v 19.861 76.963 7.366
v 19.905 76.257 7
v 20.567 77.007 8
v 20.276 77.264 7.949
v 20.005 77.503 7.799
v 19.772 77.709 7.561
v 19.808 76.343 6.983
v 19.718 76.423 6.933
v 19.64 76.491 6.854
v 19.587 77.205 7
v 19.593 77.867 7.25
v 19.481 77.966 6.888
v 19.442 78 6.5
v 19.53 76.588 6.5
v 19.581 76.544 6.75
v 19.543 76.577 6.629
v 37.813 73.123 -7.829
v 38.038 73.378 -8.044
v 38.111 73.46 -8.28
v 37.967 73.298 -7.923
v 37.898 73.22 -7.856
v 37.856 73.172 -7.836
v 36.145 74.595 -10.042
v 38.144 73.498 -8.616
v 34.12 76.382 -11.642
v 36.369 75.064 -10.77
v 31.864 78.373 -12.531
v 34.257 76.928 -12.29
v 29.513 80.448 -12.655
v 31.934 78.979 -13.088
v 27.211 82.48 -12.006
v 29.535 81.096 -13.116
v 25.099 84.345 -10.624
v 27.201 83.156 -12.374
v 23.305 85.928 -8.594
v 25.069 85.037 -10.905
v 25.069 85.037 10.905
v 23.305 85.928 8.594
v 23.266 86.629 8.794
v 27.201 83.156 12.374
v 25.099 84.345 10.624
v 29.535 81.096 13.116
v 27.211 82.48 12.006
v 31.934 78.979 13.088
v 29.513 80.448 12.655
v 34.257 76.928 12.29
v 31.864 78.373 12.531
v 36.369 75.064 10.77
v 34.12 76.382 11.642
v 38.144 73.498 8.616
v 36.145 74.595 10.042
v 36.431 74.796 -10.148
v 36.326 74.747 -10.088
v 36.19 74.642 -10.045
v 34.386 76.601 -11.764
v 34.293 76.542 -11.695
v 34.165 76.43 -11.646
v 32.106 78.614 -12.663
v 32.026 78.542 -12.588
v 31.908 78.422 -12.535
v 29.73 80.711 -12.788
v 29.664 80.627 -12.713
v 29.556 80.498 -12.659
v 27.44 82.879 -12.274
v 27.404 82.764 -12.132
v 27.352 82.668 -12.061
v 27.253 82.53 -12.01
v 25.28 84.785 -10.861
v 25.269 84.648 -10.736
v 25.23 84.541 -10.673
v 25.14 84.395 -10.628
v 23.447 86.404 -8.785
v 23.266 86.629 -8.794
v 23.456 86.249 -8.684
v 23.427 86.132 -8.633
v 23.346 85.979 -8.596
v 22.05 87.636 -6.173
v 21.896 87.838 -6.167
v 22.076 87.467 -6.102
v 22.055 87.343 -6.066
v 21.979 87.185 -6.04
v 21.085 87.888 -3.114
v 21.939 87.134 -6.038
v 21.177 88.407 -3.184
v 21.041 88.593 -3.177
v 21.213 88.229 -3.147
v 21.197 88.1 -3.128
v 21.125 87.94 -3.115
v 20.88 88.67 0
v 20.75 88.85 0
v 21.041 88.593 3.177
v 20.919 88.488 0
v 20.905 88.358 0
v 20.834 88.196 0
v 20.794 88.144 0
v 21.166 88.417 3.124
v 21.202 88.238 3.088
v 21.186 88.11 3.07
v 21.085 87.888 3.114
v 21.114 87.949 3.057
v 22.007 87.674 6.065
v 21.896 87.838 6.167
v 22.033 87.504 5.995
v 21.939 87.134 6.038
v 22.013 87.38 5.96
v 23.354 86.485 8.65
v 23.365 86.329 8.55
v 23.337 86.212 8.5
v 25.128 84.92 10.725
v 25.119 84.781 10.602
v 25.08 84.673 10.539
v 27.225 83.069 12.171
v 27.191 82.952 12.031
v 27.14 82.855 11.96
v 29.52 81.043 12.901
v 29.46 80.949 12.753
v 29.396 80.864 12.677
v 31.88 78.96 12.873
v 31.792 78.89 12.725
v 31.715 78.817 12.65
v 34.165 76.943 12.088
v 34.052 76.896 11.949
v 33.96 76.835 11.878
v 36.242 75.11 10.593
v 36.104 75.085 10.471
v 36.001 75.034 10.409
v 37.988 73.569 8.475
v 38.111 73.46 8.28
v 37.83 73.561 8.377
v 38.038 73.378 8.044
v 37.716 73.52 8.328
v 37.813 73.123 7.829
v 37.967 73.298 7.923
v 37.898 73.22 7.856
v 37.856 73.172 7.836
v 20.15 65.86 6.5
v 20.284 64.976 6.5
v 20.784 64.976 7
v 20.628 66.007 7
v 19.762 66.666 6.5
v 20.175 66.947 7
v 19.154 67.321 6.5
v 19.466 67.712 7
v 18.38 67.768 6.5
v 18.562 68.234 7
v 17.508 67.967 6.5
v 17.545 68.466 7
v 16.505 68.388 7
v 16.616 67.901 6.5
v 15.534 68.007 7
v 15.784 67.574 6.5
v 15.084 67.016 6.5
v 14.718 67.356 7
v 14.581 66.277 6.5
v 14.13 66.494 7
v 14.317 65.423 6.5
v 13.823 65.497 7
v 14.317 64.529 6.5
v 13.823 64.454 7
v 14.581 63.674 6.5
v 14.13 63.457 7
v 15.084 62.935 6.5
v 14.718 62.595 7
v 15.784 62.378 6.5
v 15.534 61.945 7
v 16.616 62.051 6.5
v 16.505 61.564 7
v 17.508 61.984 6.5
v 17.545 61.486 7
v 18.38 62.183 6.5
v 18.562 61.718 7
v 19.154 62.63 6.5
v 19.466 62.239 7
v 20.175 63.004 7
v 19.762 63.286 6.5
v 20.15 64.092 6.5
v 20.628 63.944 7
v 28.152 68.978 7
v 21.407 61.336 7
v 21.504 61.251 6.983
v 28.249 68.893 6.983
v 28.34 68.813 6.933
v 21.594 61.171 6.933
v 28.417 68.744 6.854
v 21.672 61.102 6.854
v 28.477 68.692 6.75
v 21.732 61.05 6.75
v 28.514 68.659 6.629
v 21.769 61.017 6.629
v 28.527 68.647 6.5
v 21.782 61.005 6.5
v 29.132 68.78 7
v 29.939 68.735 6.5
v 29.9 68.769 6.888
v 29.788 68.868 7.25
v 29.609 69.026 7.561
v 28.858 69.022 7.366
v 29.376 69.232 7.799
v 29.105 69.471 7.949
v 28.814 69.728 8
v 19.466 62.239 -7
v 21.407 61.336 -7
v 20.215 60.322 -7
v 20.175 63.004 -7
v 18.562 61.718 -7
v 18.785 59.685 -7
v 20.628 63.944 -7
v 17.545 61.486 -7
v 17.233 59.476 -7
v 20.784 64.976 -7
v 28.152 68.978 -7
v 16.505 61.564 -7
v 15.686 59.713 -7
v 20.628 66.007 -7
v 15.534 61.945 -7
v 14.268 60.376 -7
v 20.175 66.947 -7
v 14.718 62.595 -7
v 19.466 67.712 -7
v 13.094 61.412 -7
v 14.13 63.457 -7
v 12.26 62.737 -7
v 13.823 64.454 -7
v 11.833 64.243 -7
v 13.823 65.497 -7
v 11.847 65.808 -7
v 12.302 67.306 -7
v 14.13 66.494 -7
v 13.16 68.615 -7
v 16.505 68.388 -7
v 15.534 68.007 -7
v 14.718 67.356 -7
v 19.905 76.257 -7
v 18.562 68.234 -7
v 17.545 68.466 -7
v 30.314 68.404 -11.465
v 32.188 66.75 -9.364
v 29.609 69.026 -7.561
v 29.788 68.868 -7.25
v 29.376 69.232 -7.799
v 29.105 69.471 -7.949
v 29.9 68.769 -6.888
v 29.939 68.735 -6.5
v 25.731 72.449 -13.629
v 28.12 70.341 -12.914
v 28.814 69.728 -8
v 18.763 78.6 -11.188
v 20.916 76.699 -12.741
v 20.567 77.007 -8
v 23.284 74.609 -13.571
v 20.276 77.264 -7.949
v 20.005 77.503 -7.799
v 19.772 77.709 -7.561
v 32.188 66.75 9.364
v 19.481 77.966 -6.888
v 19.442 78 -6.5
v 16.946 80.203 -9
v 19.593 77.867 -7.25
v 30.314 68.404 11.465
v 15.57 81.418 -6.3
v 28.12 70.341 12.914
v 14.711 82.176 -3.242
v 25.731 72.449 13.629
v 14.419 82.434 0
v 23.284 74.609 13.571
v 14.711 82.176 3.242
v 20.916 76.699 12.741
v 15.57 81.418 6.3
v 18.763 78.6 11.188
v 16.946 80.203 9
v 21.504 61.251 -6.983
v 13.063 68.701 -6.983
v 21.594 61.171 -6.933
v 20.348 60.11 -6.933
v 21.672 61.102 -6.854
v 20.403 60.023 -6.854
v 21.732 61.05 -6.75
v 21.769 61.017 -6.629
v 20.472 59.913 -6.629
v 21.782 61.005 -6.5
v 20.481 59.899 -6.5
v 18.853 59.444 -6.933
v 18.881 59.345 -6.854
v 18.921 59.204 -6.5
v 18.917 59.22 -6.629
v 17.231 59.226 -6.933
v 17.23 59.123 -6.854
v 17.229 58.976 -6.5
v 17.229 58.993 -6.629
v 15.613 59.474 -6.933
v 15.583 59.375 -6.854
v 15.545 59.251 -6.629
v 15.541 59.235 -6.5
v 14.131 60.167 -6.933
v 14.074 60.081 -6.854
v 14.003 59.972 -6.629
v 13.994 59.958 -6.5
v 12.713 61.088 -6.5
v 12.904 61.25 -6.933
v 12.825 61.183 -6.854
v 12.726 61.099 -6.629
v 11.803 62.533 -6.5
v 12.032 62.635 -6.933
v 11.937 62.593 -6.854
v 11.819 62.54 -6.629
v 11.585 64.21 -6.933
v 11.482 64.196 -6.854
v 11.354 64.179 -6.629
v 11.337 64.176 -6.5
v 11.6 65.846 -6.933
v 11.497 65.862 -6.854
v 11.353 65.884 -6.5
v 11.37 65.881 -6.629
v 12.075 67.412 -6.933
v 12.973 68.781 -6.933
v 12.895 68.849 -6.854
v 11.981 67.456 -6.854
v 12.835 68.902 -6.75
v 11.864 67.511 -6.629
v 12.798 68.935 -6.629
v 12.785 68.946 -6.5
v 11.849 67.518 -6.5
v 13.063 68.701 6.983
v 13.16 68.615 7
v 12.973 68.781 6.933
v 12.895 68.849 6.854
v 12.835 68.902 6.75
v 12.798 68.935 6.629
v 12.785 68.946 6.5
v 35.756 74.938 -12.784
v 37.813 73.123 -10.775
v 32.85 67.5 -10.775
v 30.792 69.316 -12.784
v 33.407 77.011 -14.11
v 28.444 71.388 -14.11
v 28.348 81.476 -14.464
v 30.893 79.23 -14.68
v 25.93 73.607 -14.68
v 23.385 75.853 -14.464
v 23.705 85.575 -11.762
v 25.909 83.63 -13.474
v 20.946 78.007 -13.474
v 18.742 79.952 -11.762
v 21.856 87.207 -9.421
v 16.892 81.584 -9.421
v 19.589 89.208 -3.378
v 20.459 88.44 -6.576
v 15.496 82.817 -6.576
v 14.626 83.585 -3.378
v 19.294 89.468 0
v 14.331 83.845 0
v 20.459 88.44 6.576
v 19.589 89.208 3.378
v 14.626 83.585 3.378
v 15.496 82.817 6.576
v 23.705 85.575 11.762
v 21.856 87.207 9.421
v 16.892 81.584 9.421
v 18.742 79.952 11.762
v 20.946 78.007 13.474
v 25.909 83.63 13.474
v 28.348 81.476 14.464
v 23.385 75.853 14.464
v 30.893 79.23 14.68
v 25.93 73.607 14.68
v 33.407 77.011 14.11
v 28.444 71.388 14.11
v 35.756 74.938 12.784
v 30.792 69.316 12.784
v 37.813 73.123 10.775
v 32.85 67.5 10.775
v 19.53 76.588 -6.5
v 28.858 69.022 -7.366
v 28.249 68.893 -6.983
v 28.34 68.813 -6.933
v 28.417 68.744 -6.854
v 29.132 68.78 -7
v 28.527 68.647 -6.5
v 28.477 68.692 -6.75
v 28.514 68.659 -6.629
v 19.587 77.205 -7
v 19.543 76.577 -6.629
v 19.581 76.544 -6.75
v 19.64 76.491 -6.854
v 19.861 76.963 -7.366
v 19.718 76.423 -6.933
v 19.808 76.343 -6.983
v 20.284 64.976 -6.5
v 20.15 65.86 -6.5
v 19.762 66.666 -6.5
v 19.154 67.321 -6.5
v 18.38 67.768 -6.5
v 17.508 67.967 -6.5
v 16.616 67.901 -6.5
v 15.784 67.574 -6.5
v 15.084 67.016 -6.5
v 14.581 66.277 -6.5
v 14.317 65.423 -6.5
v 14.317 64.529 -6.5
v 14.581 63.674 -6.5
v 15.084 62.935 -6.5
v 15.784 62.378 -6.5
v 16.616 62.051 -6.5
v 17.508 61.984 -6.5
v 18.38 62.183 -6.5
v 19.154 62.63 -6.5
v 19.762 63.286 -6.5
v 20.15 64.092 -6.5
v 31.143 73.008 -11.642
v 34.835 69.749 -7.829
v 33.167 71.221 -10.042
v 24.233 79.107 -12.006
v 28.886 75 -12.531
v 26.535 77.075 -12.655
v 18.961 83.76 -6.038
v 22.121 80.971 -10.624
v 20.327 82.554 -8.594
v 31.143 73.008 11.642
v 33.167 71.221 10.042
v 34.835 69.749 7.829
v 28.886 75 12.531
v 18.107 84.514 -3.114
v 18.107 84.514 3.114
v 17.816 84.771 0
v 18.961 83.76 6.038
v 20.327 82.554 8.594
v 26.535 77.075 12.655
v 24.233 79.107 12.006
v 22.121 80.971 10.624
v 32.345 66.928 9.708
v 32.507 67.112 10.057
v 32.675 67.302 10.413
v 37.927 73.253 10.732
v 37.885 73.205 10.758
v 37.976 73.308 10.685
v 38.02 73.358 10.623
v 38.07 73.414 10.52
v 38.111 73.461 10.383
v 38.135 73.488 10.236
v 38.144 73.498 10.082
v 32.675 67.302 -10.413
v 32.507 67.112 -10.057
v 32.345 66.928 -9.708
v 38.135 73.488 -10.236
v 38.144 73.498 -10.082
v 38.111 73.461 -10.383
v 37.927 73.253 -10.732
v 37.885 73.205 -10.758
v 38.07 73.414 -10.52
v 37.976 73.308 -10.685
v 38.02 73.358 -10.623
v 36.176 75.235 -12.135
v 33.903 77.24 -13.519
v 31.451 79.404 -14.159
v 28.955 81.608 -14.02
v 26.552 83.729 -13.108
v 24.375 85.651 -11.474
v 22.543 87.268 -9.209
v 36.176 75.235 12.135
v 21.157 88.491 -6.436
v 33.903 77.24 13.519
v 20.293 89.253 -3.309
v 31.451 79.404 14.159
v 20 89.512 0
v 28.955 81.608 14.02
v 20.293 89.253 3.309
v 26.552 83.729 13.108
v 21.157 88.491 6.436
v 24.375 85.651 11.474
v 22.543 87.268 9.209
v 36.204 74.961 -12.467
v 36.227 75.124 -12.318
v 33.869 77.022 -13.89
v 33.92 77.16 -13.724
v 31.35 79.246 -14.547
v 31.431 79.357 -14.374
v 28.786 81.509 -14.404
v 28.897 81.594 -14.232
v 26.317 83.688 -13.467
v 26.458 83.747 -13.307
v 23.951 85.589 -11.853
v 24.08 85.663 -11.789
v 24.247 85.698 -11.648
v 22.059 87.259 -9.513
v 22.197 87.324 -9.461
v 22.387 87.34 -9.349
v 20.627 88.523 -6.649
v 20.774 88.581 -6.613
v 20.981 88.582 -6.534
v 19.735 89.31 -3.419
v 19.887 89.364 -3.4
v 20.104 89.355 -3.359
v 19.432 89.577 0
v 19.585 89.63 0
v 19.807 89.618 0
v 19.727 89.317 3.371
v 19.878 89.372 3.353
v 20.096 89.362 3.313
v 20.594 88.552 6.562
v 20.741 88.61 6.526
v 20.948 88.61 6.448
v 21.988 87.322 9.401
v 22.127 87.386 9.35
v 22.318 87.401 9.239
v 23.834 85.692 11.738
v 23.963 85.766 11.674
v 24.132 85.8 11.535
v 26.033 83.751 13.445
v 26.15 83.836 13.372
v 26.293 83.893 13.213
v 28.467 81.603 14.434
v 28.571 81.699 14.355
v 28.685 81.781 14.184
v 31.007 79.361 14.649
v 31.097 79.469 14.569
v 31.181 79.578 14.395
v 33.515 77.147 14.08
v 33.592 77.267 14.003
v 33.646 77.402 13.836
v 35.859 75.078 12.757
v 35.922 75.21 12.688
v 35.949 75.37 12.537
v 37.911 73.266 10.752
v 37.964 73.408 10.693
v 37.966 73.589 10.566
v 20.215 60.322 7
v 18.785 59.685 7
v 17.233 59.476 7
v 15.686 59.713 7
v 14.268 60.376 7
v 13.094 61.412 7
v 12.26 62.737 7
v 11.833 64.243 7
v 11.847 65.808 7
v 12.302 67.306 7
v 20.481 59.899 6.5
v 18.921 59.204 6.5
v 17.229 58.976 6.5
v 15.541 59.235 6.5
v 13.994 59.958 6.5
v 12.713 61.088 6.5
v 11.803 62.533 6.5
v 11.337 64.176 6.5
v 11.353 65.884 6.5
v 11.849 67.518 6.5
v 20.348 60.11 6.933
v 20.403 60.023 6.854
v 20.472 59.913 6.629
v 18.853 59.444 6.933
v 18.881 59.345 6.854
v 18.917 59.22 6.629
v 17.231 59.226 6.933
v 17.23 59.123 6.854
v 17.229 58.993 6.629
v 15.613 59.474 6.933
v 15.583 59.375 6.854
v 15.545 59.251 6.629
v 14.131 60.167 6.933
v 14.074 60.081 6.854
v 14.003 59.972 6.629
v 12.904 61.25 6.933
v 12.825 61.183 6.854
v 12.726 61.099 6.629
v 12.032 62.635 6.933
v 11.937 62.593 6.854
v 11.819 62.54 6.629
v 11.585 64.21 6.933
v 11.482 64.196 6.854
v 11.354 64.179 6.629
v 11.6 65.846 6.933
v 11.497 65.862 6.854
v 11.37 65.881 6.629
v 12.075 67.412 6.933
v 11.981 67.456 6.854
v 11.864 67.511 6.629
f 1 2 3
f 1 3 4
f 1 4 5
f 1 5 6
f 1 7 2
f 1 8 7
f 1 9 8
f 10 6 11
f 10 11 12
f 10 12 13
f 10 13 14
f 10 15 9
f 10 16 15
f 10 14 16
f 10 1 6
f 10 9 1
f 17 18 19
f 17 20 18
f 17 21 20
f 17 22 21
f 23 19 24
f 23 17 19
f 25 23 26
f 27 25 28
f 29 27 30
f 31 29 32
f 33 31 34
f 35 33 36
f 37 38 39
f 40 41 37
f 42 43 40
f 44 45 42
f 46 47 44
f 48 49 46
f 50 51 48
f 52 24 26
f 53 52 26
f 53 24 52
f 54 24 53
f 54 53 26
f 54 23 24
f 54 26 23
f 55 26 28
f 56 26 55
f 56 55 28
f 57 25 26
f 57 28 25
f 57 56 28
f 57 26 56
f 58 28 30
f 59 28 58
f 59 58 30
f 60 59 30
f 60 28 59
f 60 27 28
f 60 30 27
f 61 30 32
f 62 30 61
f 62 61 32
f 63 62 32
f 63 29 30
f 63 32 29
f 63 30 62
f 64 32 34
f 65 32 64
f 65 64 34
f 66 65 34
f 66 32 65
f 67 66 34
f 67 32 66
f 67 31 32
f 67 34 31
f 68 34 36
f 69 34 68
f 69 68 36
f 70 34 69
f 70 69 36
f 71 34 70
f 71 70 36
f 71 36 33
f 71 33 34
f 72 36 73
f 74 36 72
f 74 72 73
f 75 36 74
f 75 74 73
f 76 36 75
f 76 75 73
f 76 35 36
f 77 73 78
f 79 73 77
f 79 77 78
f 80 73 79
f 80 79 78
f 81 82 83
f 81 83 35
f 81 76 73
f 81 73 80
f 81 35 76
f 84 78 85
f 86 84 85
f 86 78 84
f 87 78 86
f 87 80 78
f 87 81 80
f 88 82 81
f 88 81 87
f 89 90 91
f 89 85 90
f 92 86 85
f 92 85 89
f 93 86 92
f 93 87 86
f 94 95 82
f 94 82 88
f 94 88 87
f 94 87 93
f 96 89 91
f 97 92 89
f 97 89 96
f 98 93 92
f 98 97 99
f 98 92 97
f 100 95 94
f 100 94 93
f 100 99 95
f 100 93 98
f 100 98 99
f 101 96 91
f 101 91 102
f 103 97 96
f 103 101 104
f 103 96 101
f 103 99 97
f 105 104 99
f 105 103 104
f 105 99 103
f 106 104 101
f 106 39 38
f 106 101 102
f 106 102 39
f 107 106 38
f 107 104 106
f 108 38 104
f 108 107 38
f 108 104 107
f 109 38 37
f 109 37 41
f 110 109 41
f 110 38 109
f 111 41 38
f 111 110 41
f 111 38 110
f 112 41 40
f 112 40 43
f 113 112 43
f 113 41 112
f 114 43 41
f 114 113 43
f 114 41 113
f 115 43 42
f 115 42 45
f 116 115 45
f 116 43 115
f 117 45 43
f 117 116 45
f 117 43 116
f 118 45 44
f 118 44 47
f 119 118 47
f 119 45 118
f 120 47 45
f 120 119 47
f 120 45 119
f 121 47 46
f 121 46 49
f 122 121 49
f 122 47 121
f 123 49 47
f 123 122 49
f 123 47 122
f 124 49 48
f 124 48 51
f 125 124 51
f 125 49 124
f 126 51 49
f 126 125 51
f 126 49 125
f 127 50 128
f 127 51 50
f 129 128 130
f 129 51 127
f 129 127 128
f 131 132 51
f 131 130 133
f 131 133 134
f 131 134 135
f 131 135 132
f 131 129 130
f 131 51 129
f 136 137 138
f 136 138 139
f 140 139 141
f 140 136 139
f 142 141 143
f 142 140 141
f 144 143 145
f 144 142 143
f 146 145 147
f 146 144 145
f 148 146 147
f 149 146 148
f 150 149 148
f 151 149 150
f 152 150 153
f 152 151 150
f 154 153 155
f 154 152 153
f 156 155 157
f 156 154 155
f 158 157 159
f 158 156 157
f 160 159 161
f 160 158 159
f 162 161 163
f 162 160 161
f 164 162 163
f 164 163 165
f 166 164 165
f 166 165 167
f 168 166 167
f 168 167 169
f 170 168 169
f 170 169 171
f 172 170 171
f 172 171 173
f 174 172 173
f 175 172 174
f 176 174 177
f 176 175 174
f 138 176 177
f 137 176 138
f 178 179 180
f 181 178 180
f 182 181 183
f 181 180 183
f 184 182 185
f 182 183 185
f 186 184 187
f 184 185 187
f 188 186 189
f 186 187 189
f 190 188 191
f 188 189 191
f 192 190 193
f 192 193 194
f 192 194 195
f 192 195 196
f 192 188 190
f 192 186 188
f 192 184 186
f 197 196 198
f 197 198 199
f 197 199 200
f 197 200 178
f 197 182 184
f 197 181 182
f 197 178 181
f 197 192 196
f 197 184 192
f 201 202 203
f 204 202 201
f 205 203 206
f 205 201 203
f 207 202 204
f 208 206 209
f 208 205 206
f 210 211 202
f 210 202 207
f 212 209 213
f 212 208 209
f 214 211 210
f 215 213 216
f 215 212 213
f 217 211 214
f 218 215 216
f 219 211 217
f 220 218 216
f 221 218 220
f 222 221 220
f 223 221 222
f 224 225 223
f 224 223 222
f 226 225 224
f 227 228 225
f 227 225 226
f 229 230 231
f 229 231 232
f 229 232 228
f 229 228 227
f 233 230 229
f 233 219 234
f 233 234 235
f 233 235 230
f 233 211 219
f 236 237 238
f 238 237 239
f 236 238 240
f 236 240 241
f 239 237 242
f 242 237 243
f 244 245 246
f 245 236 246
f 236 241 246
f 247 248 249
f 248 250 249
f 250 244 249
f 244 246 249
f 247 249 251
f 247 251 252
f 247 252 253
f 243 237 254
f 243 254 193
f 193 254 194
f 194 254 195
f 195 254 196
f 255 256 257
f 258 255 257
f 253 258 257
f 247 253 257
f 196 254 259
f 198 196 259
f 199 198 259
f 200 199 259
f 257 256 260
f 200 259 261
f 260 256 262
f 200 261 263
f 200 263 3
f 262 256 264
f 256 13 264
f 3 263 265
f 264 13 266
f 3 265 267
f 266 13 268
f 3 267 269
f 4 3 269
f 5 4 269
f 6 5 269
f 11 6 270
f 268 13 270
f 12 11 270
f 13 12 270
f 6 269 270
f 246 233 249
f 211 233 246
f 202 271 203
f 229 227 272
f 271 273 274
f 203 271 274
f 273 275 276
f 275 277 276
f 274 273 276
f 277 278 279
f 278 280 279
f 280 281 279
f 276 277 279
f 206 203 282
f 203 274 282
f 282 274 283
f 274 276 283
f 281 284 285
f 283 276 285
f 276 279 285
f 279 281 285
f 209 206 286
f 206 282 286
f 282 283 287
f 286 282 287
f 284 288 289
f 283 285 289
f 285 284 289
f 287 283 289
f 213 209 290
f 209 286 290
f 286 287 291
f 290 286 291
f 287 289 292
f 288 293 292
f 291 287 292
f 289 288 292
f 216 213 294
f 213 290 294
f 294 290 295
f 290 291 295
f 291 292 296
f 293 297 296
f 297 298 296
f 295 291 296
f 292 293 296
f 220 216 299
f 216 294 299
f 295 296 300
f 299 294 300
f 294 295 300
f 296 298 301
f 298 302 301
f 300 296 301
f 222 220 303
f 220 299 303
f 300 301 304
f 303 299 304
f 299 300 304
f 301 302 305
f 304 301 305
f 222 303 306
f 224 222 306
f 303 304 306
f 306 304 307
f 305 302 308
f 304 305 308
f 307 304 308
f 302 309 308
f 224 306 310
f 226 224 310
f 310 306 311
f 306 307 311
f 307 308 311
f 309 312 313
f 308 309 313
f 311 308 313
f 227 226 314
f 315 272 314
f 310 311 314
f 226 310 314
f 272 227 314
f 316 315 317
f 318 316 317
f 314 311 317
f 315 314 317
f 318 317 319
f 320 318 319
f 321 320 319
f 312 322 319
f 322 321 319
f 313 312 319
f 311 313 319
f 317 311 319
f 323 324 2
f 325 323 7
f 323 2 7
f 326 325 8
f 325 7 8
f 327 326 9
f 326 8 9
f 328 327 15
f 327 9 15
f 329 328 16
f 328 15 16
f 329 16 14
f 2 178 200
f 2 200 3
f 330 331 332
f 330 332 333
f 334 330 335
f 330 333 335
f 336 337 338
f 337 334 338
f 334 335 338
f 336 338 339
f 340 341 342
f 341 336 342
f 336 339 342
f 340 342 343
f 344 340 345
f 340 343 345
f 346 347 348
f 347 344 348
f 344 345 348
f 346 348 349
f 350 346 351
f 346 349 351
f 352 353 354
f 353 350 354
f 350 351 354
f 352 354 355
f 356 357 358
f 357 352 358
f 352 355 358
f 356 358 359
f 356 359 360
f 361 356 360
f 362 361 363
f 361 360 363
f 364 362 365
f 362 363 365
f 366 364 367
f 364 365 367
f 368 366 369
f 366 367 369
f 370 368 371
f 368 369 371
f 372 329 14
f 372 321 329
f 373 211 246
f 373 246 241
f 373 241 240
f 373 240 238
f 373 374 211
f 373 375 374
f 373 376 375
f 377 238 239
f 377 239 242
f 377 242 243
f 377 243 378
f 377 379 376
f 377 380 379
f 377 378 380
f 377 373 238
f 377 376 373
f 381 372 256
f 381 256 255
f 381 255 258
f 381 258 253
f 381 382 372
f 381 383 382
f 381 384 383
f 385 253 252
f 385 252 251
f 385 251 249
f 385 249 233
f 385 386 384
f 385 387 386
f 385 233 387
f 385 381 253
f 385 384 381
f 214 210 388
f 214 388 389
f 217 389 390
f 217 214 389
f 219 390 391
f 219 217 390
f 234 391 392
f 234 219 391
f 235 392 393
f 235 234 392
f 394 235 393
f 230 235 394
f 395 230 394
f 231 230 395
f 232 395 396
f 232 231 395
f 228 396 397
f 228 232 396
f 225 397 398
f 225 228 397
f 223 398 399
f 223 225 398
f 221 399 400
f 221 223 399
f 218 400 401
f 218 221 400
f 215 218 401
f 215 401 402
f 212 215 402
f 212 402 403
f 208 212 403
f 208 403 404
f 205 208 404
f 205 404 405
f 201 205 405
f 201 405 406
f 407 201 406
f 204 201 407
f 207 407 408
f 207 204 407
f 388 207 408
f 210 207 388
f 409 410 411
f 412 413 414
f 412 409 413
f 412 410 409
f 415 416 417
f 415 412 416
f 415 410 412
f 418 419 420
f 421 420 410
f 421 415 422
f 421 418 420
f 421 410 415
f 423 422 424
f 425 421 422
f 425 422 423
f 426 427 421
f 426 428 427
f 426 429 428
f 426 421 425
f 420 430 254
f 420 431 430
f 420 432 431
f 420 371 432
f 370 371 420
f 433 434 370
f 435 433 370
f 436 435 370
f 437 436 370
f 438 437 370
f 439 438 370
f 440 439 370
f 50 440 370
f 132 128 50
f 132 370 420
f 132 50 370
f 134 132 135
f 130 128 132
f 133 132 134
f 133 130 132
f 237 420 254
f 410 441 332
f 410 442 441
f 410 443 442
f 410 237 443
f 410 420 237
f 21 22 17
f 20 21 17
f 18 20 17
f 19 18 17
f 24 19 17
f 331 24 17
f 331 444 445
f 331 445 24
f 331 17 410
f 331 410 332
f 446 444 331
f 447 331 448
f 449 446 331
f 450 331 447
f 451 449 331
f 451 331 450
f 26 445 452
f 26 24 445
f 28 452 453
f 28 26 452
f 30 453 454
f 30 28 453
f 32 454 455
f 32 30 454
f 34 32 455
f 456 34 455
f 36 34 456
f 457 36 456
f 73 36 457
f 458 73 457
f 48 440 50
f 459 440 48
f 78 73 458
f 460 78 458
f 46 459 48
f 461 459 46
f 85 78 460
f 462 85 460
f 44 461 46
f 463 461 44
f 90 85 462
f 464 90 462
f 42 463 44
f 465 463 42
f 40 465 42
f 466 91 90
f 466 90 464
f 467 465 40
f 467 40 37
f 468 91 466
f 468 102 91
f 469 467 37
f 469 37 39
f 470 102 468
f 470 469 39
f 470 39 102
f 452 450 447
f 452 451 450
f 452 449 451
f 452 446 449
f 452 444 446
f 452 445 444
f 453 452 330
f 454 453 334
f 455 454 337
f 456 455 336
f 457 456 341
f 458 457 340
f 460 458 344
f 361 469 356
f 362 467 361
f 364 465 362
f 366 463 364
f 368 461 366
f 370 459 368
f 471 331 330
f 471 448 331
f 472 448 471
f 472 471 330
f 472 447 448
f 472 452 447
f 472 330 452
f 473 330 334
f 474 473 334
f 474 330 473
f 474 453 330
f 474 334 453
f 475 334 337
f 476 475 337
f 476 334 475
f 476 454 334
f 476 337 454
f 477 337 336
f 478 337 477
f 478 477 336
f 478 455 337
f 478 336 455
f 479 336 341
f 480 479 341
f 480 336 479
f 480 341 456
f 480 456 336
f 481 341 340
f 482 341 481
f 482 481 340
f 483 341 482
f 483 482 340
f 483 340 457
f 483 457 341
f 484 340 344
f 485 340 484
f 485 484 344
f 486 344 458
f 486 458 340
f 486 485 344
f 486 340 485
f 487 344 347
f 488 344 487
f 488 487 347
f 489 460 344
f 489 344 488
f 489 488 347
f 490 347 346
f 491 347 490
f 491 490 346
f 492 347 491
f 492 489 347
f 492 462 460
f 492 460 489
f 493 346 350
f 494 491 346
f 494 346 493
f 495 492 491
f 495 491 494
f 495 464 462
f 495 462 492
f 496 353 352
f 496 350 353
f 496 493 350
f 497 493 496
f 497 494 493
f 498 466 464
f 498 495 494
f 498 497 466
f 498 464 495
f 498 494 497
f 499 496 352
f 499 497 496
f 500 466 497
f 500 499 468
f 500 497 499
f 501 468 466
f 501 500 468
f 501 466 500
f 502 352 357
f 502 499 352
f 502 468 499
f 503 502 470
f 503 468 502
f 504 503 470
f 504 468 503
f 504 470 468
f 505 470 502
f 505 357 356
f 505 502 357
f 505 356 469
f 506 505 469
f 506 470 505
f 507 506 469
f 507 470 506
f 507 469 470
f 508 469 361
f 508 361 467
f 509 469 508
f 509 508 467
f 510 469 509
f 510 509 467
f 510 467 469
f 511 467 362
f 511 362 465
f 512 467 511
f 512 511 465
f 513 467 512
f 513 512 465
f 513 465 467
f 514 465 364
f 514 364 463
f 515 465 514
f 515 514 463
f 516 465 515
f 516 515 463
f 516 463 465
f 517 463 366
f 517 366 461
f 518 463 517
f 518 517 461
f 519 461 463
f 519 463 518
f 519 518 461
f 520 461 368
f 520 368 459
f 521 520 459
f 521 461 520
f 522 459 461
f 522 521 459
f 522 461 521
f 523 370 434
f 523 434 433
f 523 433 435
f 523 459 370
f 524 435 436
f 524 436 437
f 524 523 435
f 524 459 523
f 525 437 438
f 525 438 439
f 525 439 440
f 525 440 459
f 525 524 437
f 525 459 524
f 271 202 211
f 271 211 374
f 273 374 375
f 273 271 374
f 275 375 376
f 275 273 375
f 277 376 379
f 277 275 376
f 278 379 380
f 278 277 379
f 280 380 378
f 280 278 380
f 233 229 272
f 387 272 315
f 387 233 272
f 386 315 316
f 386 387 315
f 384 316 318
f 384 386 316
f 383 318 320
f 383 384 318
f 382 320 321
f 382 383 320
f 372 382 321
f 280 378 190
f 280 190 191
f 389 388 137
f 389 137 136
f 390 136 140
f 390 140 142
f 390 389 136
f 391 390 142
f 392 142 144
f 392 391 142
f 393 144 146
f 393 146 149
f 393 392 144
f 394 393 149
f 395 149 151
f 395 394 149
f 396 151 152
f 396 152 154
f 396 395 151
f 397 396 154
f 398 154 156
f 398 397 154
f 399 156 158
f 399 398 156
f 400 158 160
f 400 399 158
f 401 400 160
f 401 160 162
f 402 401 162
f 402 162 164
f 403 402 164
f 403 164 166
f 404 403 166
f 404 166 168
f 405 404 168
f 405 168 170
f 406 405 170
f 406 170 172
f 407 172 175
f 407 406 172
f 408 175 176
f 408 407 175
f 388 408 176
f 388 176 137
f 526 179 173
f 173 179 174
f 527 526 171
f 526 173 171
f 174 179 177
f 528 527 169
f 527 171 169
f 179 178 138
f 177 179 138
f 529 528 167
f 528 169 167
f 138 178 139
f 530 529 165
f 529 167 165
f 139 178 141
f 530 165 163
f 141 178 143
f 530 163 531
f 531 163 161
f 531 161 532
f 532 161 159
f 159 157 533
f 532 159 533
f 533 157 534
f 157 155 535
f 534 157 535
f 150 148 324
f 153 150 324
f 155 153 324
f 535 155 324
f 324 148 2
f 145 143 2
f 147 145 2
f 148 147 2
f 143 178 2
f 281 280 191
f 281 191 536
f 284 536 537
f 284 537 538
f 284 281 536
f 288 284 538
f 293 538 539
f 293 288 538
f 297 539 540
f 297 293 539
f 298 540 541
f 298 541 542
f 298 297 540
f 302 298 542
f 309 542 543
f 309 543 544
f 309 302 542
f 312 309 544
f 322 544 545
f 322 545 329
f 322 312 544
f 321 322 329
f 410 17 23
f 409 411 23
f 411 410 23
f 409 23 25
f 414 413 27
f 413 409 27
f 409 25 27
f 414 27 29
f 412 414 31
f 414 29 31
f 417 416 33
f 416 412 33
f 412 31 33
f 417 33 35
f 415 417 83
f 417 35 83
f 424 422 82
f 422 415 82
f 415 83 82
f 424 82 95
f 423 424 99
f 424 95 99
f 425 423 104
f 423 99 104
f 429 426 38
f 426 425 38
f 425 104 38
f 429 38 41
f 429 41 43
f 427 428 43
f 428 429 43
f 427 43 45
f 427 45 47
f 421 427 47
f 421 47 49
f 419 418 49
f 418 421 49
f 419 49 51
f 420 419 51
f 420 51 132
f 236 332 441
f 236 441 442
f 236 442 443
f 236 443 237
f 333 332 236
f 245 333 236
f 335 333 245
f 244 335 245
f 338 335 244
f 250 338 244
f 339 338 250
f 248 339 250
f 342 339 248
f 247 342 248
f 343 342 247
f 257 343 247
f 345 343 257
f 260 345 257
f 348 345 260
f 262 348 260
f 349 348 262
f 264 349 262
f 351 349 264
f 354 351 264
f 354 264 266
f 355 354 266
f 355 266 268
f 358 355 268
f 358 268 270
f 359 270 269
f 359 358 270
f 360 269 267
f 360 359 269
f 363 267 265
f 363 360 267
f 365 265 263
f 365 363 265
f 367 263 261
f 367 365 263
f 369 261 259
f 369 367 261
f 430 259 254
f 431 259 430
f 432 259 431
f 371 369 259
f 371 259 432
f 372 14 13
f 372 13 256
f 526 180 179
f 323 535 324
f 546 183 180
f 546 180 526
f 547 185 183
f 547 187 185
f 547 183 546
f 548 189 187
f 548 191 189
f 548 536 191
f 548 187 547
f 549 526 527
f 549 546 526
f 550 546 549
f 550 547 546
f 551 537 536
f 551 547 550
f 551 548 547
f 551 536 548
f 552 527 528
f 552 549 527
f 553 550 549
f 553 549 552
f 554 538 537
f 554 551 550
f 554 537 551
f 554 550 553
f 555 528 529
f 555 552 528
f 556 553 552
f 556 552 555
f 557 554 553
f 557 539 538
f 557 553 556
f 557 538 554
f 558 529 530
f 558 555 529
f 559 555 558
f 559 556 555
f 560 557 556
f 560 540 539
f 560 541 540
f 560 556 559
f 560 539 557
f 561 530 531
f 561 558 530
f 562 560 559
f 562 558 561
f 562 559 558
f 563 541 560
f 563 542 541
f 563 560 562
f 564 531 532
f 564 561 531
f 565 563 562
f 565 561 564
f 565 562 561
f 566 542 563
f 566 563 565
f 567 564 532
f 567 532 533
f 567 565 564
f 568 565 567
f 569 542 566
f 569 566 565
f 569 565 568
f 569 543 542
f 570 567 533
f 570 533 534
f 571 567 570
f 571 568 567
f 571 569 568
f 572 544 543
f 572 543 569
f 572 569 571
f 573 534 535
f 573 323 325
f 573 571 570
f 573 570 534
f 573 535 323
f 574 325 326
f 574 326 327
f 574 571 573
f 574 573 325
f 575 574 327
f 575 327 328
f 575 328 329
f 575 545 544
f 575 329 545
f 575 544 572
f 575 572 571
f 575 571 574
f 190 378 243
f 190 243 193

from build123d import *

# Parameters (mm, degrees)
BOSS_EXTRUDE1_DEPTH      = 7
BOSS_EXTRUDE1_DEPTH_BACK = 7
SKETCH2_R                = 3.0000000000000018
BOSS_EXTRUDE2_DEPTH      = 2
BOSS_EXTRUDE2_DEPTH_BACK = 2
SKETCH3_R                = 14.700000000000001
BOSS_EXTRUDE3_START      = 5
SKETCH4_R                = 14.700000000000001
SKETCH4_R_2              = 12.699999999999998
BOSS_EXTRUDE3_DEPTH      = 5
FILLET2_R                = 0.5
FILLET4_R                = 0.5
CHAMFER1_SIZE            = 0.5
CHAMFER2_SIZE            = 1
CUT_EXTRUDE1_DEPTH       = 54.24291481918433


with BuildPart() as part:
    # Sketch2 → Boss-Extrude1 (new, two sides: drawn at the far end of the back side and taken through both)
    with BuildSketch(Plane.XY.offset(-BOSS_EXTRUDE1_DEPTH_BACK)):
        with BuildLine():
            Line((30.512377936980783, 70.89647327651264), (21.781878923827843, 61.0053372557492))
            ThreePointArc((21.781878923827843, 61.0053372557492), (13.313031061350836, 60.477496482202135), (12.78519028780376, 68.94634434467913))
            Line((12.78519028780376, 68.94634434467913), (21.51568930095671, 78.83748036544256))
            Line((21.51568930095671, 78.83748036544256), (30.512377936980783, 70.89647327651264))
        make_face()
        with Locations((17.283534605815802, 64.97584080021417)):
            Circle(SKETCH2_R, mode=Mode.SUBTRACT)
    extrude(amount=BOSS_EXTRUDE1_DEPTH + BOSS_EXTRUDE1_DEPTH_BACK)

    # Sketch3 → Boss-Extrude2 (add, two sides: drawn at the far end of the back side and taken through both)
    with BuildSketch(Plane(origin=(48.53568375746082, 54.98804239970119, 0), x_dir=(0.7497240530020064, -0.66175059074416, 0), z_dir=(0.66175059074416, 0.7497240530020064, 0)).offset(-BOSS_EXTRUDE2_DEPTH_BACK)):
        with Locations((-30.039919418767553, 0)):
            Circle(SKETCH3_R)
    extrude(amount=BOSS_EXTRUDE2_DEPTH + BOSS_EXTRUDE2_DEPTH_BACK)

    # Sketch4 → Boss-Extrude3 (add)
    with BuildSketch(Plane(origin=(49.85918493894915, 56.48749050570521, 0), x_dir=(0.7497240530020064, -0.66175059074416, 0), z_dir=(0.66175059074416, 0.7497240530020064, 0)).offset(BOSS_EXTRUDE3_START)):
        with Locations((-30.03991941876756, 0)):
            Circle(SKETCH4_R)
        with Locations((-30.03991941876756, 0)):
            Circle(SKETCH4_R_2, mode=Mode.SUBTRACT)
    extrude(amount=-BOSS_EXTRUDE3_DEPTH)

    # Fillet2
    fillet2_edges = [part.edges().sort_by_distance(p)[0] for p in [
        (21.12479228105238, 88.51927769444247, -1.56e-15),
        (19.62534417504836, 89.84277887593079, -1.8e-15),
    ]]
    fillet(fillet2_edges, radius=FILLET2_R)

    # Fillet4
    fillet4_edges = [part.edges().sort_by_distance(p)[0] for p in [
        (25.48537783966015, 65.2011812131289, -7),
        (13.313031061350841, 60.47749648220213, -7),
        (16.488689203636067, 73.14218830205883, -7),
        (25.48537783966015, 65.2011812131289, 7),
        (13.313031061350841, 60.47749648220213, 7),
        (16.488689203636067, 73.14218830205883, 7),
    ]]
    fillet(fillet4_edges, radius=FILLET4_R)

    # Chamfer1
    chamfer1_edges = [part.edges().sort_by_distance(p)[0] for p in [
        (14.2835346058158, 64.97584080021417, 7),
        (14.2835346058158, 64.97584080021417, -7),
    ]]
    chamfer(chamfer1_edges, length=CHAMFER1_SIZE)

    # Chamfer2
    chamfer2_edges = [part.edges().sort_by_distance(p)[0] for p in [
        (20.301982665021182, 77.24112112915115, 6.853553390593271),
        (20.192188119468376, 77.33803225943853, -7e-17),
        (20.301982665021182, 77.24112112915115, -6.853553390593271),
        (24.690532437480417, 73.36752871497357, -7),
        (29.079082209939642, 69.493936300796, -6.853553390593275),
        (29.18887675549246, 69.39702517050861, -7e-17),
        (29.079082209939642, 69.493936300796, 6.853553390593275),
        (24.690532437480417, 73.36752871497357, 7),
        (13.66958885835092, 83.09526239891272, -1.8e-15),
    ]]
    chamfer(chamfer2_edges, length=CHAMFER2_SIZE)

    # Sketch5 → Cut-Extrude1 (cut, through all)
    with BuildSketch(Plane(origin=(53.16793789266995, 60.23611077071524, 0), x_dir=(0.7497240530020064, -0.66175059074416, 0), z_dir=(0.66175059074416, 0.7497240530020064, 0))):
        Polygon((-10.039919418767552, 12.5), (-10.039919418767552, -12.5), (-20.03991941876755, -12.500000000000004), (-20.03991941876755, 12.500000000000004), align=None)
    extrude(amount=-CUT_EXTRUDE1_DEPTH, mode=Mode.SUBTRACT)


solid = part.part
